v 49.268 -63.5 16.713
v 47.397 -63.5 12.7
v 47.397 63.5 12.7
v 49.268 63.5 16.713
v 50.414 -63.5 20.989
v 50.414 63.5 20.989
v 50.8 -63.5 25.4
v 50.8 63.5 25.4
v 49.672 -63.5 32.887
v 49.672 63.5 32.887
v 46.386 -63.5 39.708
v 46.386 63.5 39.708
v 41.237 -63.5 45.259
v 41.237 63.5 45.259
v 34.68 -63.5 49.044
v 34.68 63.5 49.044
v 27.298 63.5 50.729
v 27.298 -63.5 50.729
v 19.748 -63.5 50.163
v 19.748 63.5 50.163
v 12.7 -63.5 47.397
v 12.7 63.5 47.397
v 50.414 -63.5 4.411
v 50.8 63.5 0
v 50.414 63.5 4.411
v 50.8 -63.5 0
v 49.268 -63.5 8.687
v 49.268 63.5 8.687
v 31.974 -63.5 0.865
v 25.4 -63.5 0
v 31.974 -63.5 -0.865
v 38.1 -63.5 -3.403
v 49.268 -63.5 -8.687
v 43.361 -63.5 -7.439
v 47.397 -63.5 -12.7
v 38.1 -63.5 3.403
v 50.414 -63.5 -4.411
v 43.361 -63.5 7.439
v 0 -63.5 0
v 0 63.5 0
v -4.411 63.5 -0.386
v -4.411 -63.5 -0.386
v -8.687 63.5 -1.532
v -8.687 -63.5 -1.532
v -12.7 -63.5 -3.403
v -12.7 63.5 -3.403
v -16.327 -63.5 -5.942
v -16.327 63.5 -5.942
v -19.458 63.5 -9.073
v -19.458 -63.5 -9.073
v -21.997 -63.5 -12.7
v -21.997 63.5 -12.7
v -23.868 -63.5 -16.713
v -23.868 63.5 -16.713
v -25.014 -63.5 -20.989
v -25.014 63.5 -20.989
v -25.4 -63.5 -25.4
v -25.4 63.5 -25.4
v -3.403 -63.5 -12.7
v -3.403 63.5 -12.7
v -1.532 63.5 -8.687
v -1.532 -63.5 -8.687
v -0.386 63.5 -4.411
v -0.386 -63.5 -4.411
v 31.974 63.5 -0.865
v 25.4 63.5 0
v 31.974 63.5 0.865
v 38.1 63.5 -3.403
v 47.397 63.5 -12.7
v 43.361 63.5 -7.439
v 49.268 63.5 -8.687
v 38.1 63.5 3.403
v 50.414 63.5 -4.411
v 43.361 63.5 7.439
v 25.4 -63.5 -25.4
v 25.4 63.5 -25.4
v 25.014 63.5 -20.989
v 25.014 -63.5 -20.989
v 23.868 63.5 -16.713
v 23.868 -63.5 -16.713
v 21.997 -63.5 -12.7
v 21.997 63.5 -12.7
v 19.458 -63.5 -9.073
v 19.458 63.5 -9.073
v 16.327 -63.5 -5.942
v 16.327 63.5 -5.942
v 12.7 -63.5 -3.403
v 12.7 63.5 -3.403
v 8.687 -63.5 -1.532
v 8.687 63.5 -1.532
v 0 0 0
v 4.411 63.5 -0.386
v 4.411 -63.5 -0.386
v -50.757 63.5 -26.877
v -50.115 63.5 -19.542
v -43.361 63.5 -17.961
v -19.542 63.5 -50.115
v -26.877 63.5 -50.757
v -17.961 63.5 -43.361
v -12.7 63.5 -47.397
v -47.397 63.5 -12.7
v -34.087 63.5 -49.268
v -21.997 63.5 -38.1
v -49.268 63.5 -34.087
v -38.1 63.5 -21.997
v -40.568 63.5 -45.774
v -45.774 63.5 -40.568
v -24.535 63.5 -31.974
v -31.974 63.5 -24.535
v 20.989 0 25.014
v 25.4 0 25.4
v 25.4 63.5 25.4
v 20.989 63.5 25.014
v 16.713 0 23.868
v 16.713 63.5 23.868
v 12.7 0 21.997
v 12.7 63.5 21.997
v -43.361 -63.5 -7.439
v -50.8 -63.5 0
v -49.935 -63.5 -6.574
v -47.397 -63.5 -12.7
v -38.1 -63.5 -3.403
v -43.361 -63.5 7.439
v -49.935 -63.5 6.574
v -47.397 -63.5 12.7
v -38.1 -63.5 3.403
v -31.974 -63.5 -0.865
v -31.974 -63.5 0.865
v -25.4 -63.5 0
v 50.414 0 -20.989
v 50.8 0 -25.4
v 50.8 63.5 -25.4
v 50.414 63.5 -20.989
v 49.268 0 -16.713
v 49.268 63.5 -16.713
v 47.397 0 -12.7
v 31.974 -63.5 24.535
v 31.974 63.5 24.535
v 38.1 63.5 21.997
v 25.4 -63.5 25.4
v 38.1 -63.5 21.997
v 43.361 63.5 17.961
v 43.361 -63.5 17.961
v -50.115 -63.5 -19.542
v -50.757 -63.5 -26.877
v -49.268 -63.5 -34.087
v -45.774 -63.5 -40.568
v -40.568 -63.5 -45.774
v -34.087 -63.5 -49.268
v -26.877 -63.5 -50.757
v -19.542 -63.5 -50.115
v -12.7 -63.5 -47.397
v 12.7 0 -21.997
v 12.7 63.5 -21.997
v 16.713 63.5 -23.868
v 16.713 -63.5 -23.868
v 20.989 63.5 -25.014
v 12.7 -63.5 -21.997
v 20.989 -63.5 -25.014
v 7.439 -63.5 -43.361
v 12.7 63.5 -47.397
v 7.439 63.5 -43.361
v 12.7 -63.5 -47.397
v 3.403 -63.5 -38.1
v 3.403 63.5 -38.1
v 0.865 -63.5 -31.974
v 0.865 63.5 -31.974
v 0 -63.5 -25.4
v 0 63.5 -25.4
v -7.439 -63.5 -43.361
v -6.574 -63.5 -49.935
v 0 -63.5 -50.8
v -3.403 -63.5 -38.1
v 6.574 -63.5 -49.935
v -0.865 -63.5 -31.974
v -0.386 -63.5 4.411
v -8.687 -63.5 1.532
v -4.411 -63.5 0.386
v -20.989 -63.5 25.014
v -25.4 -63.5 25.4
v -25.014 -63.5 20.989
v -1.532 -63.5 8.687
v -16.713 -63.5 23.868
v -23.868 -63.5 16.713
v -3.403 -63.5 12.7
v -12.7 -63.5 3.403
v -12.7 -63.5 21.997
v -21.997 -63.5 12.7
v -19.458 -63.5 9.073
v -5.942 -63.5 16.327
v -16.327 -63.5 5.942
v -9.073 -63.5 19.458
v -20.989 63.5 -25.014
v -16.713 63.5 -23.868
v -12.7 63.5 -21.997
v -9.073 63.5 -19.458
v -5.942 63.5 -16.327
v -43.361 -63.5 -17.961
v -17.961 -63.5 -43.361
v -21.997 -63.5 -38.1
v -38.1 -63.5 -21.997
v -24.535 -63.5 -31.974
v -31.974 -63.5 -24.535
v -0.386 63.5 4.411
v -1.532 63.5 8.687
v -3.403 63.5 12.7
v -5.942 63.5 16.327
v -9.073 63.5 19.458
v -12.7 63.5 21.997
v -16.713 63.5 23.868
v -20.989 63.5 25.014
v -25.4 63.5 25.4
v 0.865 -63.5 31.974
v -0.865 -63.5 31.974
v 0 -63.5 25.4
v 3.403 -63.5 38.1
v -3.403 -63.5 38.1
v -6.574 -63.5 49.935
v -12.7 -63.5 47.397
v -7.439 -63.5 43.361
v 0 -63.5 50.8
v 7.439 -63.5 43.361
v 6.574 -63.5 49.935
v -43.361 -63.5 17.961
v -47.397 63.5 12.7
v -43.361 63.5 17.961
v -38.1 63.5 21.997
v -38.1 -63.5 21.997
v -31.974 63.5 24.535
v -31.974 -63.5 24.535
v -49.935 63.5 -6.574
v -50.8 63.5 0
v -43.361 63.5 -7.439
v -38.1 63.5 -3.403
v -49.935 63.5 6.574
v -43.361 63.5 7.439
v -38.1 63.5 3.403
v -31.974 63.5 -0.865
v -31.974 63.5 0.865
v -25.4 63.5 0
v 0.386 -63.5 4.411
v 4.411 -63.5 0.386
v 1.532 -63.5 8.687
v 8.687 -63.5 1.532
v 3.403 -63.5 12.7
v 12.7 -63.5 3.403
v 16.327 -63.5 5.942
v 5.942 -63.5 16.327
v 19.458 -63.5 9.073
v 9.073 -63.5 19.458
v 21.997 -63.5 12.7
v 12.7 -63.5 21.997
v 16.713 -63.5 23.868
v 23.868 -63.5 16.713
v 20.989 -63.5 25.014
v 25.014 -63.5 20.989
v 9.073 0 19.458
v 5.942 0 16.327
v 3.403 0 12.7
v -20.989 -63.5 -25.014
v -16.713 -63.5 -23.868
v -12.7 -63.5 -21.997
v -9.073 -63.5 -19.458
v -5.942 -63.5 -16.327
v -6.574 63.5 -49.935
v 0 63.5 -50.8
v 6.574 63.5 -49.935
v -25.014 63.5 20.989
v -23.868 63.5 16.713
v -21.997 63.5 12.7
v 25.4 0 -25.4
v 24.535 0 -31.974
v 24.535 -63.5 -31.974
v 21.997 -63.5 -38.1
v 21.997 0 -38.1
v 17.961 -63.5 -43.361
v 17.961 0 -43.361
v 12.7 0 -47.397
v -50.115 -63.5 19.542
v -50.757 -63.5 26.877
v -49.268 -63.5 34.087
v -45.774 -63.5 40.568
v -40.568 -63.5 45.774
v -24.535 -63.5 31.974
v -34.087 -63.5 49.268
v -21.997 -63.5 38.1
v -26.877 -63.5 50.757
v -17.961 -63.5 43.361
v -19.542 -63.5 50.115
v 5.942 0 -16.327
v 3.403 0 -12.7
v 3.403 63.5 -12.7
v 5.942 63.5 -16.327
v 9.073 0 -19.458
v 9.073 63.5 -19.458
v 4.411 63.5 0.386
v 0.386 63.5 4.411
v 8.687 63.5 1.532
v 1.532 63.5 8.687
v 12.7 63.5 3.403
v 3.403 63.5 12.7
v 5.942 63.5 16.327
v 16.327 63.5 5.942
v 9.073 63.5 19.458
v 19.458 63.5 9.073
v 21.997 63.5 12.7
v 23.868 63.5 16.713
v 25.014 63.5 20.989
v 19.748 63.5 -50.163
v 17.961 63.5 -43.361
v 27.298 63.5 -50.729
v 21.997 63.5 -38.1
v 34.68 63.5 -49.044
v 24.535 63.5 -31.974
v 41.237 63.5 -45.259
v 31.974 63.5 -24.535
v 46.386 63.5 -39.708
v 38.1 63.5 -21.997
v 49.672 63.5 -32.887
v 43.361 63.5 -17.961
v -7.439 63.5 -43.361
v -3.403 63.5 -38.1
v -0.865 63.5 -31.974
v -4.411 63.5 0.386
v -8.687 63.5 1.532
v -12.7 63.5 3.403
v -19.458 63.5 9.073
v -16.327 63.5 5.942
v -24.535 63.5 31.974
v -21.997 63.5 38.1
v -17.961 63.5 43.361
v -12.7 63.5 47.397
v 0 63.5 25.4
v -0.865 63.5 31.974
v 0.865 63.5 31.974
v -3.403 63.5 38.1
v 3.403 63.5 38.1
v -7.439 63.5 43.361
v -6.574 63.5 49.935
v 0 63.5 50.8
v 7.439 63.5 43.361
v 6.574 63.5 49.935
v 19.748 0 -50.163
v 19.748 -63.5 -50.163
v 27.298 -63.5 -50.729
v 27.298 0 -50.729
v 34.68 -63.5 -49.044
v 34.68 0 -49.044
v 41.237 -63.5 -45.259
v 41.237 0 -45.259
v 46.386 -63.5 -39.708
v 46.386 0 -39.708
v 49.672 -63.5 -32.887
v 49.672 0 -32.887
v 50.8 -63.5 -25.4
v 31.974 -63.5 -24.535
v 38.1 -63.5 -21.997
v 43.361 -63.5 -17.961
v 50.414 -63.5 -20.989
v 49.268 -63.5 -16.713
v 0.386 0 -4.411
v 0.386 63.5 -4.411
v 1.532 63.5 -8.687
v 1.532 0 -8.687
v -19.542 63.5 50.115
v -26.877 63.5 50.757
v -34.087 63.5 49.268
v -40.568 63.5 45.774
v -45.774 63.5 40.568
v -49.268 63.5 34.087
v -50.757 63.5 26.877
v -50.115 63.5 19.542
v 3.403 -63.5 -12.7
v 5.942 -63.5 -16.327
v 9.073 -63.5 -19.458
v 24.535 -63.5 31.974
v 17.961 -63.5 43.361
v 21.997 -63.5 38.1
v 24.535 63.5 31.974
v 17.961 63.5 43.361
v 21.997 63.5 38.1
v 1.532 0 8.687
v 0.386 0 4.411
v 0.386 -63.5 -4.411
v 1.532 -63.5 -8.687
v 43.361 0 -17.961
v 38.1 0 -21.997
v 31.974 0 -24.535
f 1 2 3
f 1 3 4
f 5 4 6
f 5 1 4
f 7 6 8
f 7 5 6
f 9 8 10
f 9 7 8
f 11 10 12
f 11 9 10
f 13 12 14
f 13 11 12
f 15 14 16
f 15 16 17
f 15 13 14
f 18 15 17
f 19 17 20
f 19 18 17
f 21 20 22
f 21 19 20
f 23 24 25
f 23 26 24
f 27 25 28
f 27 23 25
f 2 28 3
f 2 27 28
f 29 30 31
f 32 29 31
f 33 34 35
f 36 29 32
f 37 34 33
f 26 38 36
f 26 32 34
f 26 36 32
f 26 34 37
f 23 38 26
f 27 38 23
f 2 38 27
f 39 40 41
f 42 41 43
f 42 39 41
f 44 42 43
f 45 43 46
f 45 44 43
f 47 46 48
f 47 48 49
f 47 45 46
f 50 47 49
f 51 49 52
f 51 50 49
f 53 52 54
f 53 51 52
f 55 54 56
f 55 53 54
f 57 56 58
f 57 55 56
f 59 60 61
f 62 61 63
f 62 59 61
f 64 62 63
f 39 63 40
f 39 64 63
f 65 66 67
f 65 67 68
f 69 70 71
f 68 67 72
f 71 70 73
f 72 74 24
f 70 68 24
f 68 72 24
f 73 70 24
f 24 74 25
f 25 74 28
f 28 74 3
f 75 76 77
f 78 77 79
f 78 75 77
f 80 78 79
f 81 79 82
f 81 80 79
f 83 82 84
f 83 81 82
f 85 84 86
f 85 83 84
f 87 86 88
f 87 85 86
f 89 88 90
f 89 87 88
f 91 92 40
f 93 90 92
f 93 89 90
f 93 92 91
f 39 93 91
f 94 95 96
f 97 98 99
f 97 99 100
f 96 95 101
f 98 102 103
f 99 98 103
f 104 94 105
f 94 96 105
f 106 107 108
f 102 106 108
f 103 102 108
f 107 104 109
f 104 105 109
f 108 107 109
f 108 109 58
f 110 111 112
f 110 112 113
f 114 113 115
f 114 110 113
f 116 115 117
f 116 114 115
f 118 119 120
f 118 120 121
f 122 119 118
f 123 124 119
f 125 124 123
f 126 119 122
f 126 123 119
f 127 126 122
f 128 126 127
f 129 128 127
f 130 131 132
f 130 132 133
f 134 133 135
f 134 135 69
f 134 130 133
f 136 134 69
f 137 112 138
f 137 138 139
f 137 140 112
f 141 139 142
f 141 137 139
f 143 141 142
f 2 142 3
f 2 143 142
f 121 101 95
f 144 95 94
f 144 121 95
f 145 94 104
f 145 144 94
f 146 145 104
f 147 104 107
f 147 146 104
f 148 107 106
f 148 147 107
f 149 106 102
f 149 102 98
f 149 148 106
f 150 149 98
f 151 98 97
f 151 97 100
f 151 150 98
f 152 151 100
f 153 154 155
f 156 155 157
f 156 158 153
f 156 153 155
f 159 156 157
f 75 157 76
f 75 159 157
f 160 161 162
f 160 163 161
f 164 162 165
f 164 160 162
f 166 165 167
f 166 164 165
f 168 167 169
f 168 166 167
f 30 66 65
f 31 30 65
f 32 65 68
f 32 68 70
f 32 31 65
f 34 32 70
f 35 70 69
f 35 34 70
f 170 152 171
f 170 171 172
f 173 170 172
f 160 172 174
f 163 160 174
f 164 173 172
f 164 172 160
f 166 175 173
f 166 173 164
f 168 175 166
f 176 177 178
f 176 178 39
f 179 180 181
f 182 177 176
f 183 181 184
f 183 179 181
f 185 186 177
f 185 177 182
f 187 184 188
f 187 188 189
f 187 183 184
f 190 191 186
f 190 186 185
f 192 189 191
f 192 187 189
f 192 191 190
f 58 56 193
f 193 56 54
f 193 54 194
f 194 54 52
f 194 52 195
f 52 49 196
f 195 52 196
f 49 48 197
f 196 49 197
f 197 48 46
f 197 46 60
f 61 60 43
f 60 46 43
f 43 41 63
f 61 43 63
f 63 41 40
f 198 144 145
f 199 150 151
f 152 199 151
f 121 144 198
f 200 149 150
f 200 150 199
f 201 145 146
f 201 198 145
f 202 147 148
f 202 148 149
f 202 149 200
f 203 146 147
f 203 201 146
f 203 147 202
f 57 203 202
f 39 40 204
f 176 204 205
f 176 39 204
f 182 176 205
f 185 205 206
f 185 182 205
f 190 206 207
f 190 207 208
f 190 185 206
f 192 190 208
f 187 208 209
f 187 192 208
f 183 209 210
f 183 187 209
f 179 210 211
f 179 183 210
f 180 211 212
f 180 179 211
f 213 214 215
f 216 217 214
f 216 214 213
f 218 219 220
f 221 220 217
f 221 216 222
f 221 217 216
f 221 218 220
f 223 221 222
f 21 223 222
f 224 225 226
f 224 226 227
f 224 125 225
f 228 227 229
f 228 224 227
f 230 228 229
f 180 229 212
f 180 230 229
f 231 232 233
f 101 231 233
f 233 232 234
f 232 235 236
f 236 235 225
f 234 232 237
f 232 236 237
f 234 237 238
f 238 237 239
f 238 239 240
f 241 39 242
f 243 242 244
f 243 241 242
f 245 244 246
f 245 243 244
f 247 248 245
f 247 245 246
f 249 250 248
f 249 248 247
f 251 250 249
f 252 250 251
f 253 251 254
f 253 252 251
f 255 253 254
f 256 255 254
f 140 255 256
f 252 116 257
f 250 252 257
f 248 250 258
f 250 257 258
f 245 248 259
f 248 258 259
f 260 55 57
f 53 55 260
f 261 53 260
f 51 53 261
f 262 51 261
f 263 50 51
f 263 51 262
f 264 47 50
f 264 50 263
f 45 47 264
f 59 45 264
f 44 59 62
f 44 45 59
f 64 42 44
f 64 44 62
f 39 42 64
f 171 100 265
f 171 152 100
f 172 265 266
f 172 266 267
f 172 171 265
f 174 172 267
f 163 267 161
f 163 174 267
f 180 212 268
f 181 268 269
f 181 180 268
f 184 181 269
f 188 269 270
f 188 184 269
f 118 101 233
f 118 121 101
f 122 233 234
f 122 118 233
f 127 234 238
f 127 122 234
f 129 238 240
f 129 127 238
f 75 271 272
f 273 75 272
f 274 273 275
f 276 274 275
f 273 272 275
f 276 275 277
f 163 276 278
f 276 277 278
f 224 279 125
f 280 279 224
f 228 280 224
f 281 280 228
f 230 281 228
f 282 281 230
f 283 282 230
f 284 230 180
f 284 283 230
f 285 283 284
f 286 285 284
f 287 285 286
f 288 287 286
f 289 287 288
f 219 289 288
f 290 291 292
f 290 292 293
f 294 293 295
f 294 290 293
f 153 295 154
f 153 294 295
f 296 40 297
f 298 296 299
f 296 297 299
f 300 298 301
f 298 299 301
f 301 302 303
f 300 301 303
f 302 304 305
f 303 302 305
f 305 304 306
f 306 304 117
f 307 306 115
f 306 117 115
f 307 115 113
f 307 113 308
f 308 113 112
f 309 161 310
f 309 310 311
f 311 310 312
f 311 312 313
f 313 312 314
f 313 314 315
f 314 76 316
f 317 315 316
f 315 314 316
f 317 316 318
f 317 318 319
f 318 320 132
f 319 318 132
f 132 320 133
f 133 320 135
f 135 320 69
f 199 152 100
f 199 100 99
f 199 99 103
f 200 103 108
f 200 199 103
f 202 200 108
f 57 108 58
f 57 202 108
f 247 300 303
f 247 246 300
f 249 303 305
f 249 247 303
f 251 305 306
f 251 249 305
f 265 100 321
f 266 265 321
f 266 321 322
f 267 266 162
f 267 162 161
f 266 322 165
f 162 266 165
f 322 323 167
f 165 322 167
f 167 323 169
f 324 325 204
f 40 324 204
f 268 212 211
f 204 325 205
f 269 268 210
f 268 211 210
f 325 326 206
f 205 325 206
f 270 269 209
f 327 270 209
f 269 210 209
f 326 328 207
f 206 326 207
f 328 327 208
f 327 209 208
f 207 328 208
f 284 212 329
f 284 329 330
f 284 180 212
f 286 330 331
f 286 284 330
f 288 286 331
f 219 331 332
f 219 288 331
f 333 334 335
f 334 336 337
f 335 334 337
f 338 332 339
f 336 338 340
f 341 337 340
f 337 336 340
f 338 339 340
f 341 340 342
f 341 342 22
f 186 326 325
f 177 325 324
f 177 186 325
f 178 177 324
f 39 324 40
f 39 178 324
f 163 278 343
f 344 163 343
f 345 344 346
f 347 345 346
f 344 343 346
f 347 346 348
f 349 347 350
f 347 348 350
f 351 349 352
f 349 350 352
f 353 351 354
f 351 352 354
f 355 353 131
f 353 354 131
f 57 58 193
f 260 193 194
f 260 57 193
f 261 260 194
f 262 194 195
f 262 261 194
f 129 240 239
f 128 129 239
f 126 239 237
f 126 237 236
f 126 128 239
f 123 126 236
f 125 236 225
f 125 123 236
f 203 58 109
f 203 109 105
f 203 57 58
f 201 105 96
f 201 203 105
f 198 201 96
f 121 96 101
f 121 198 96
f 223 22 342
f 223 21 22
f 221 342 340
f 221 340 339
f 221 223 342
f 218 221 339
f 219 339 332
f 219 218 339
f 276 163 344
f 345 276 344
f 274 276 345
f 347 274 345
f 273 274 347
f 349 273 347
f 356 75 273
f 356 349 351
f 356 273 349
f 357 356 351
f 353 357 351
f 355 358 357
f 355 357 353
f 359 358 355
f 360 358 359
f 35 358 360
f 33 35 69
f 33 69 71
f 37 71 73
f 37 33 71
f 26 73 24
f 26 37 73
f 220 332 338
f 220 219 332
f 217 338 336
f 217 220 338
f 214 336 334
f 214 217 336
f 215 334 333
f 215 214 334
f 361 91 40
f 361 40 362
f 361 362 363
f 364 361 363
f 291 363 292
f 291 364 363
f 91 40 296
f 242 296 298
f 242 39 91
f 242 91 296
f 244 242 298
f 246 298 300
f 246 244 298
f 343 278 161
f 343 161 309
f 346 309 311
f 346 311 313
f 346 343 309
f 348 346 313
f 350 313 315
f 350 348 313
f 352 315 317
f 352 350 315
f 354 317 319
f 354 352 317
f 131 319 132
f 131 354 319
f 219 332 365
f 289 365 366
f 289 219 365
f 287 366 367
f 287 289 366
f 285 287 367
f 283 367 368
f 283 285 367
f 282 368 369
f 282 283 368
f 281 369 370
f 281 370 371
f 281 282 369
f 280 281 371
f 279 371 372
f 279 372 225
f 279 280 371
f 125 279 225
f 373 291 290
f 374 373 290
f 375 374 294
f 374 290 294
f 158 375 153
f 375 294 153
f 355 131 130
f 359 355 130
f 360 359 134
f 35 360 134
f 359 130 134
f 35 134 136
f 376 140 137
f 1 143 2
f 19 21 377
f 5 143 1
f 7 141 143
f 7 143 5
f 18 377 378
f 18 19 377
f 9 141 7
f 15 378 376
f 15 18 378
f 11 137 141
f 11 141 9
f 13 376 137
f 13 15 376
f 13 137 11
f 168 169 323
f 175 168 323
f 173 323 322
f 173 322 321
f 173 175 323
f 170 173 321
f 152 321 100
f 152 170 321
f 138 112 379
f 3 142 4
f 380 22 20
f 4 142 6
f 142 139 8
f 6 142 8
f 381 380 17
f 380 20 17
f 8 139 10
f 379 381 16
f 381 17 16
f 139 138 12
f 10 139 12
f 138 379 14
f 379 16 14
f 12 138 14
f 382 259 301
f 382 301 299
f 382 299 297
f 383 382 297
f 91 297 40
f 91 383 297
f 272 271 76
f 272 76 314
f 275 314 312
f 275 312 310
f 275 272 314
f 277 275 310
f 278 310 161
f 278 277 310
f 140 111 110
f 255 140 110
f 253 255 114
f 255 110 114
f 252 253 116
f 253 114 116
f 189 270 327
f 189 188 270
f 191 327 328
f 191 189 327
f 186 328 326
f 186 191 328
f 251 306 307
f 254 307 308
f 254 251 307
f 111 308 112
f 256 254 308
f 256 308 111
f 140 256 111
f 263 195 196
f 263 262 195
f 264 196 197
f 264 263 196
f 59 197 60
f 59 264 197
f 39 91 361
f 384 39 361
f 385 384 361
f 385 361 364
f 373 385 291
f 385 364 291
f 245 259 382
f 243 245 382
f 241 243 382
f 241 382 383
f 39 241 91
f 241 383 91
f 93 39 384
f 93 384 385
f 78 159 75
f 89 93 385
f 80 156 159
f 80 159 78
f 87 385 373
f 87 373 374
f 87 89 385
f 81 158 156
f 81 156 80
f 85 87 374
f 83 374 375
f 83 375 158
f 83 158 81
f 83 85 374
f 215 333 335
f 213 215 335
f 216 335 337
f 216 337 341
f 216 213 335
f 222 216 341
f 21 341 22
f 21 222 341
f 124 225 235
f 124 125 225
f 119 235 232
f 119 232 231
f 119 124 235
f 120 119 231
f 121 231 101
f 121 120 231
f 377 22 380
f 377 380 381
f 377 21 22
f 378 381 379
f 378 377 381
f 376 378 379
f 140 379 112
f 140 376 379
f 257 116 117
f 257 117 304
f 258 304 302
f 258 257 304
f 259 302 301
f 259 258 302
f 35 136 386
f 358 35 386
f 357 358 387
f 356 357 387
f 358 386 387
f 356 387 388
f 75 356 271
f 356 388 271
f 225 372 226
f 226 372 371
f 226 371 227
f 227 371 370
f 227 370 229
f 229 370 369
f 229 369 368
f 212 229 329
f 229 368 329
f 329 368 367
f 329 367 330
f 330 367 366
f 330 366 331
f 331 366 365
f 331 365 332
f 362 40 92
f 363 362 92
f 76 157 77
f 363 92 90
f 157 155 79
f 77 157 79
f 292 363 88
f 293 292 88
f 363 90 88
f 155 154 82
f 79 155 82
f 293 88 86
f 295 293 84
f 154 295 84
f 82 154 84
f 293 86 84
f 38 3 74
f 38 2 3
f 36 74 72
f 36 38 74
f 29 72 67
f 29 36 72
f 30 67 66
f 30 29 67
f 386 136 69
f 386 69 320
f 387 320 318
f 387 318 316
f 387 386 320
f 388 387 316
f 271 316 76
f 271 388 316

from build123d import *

# Parameters (mm, degrees)
F1_DEPTH = 63.5


with BuildPart() as f1:
    # F0 (on Front) → F1 (new body, symmetric)
    with BuildSketch(Plane.XZ):
        with BuildLine():
            ThreePointArc((47.3970452561, 12.7), (38.1, 3.4029547439), (25.4, 0))
            ThreePointArc((25.4, 0), (38.1, -3.4029547439), (47.3970452561, -12.7))
            ThreePointArc((47.3970452561, -12.7), (49.9345159877, -6.5740037456), (50.8, 0))
            ThreePointArc((50.8, 0), (49.9345159877, 6.5740037456), (47.3970452561, 12.7))
        make_face()
    extrude(amount=F1_DEPTH, both=True)


with BuildPart() as f1b:
    # F0 (on Front) → F1, piece 2 (new body, symmetric)
    with BuildSketch(Plane.XZ):
        with BuildLine():
            ThreePointArc((12.7, 3.4029547439), (17.9605122421, 7.4394877579), (21.9970452561, 12.7))
            ThreePointArc((21.9970452561, 12.7), (17.9605122421, 17.9605122421), (12.7, 21.9970452561))
            ThreePointArc((12.7, 21.9970452561), (7.4394877579, 17.9605122421), (3.4029547439, 12.7))
            ThreePointArc((3.4029547439, 12.7), (7.4394877579, 7.4394877579), (12.7, 3.4029547439))
        make_face()
        with BuildLine():
            ThreePointArc((12.7, 21.9970452561), (17.9605122421, 17.9605122421), (21.9970452561, 12.7))
            ThreePointArc((21.9970452561, 12.7), (24.5345159877, 18.8259962544), (25.4, 25.4))
            ThreePointArc((25.4, 25.4), (18.8259962544, 24.5345159877), (12.7, 21.9970452561))
        make_face()
        with BuildLine():
            ThreePointArc((0, 0), (6.5740037456, 0.8654840123), (12.7, 3.4029547439))
            ThreePointArc((12.7, 3.4029547439), (7.4394877579, 7.4394877579), (3.4029547439, 12.7))
            ThreePointArc((3.4029547439, 12.7), (0.8654840123, 6.5740037456), (0, 0))
        make_face()
    extrude(amount=F1_DEPTH, both=True)


with BuildPart() as f1c:
    # F0 (on Front) → F1, piece 3 (new body, symmetric)
    with BuildSketch(Plane.XZ):
        with BuildLine():
            ThreePointArc((25.4, -25.4), (24.5345159877, -18.8259962544), (21.9970452561, -12.7))
            ThreePointArc((21.9970452561, -12.7), (17.9605122421, -17.9605122421), (12.7, -21.9970452561))
            ThreePointArc((12.7, -21.9970452561), (18.8259962544, -24.5345159877), (25.4, -25.4))
        make_face()
        with BuildLine():
            ThreePointArc((12.7, -21.9970452561), (17.9605122421, -17.9605122421), (21.9970452561, -12.7))
            ThreePointArc((21.9970452561, -12.7), (17.9605122421, -7.4394877579), (12.7, -3.4029547439))
            ThreePointArc((12.7, -3.4029547439), (7.4394877579, -7.4394877579), (3.4029547439, -12.7))
            ThreePointArc((3.4029547439, -12.7), (7.4394877579, -17.9605122421), (12.7, -21.9970452561))
        make_face()
        with BuildLine():
            ThreePointArc((3.4029547439, -12.7), (7.4394877579, -7.4394877579), (12.7, -3.4029547439))
            ThreePointArc((12.7, -3.4029547439), (6.5740037456, -0.8654840123), (0, 0))
            ThreePointArc((0, 0), (0.8654840123, -6.5740037456), (3.4029547439, -12.7))
        make_face()
    extrude(amount=F1_DEPTH, both=True)


with BuildPart() as f1d:
    # F0 (on Front) → F1, piece 4 (new body, symmetric)
    with BuildSketch(Plane.XZ):
        with BuildLine():
            ThreePointArc((25.4, 25.4), (38.1, 21.9970452561), (47.3970452561, 12.7))
            ThreePointArc((47.3970452561, 12.7), (49.9345159877, 18.8259962544), (50.8, 25.4))
            ThreePointArc((50.8, 25.4), (38.1, 47.3970452561), (12.7, 47.3970452561))
            ThreePointArc((12.7, 47.3970452561), (21.9970452561, 38.1), (25.4, 25.4))
        make_face()
    extrude(amount=F1_DEPTH, both=True)


with BuildPart() as f1e:
    # F0 (on Front) → F1, piece 5 (new body, symmetric)
    with BuildSketch(Plane.XZ):
        with BuildLine():
            ThreePointArc((50.8, -25.4), (49.9345159877, -18.8259962544), (47.3970452561, -12.7))
            ThreePointArc((47.3970452561, -12.7), (38.1, -21.9970452561), (25.4, -25.4))
            ThreePointArc((25.4, -25.4), (21.9970452561, -38.1), (12.7, -47.3970452561))
            ThreePointArc((12.7, -47.3970452561), (38.1, -47.3970452561), (50.8, -25.4))
        make_face()
    extrude(amount=F1_DEPTH, both=True)


with BuildPart() as f1f:
    # F0 (on Front) → F1, piece 6 (new body, symmetric)
    with BuildSketch(Plane.XZ):
        with BuildLine():
            ThreePointArc((-3.4029547439, -12.7), (-0.8654840123, -6.5740037456), (0, 0))
            ThreePointArc((0, 0), (-6.5740037456, -0.8654840123), (-12.7, -3.4029547439))
            ThreePointArc((-12.7, -3.4029547439), (-7.4394877579, -7.4394877579), (-3.4029547439, -12.7))
        make_face()
        with BuildLine():
            ThreePointArc((-3.4029547439, -12.7), (-7.4394877579, -7.4394877579), (-12.7, -3.4029547439))
            ThreePointArc((-12.7, -3.4029547439), (-17.9605122421, -7.4394877579), (-21.9970452561, -12.7))
            ThreePointArc((-21.9970452561, -12.7), (-17.9605122421, -17.9605122421), (-12.7, -21.9970452561))
            ThreePointArc((-12.7, -21.9970452561), (-7.4394877579, -17.9605122421), (-3.4029547439, -12.7))
        make_face()
        with BuildLine():
            ThreePointArc((-25.4, -25.4), (-18.8259962544, -24.5345159877), (-12.7, -21.9970452561))
            ThreePointArc((-12.7, -21.9970452561), (-17.9605122421, -17.9605122421), (-21.9970452561, -12.7))
            ThreePointArc((-21.9970452561, -12.7), (-24.5345159877, -18.8259962544), (-25.4, -25.4))
        make_face()
    extrude(amount=F1_DEPTH, both=True)


with BuildPart() as f1g:
    # F0 (on Front) → F1, piece 7 (new body, symmetric)
    with BuildSketch(Plane.XZ):
        with BuildLine():
            ThreePointArc((-12.7, 3.4029547439), (-6.5740037456, 0.8654840123), (0, 0))
            ThreePointArc((0, 0), (-0.8654840123, 6.5740037456), (-3.4029547439, 12.7))
            ThreePointArc((-3.4029547439, 12.7), (-7.4394877579, 7.4394877579), (-12.7, 3.4029547439))
        make_face()
        with BuildLine():
            ThreePointArc((-21.9970452561, 12.7), (-17.9605122421, 7.4394877579), (-12.7, 3.4029547439))
            ThreePointArc((-12.7, 3.4029547439), (-7.4394877579, 7.4394877579), (-3.4029547439, 12.7))
            ThreePointArc((-3.4029547439, 12.7), (-7.4394877579, 17.9605122421), (-12.7, 21.9970452561))
            ThreePointArc((-12.7, 21.9970452561), (-17.9605122421, 17.9605122421), (-21.9970452561, 12.7))
        make_face()
        with BuildLine():
            ThreePointArc((-21.9970452561, 12.7), (-17.9605122421, 17.9605122421), (-12.7, 21.9970452561))
            ThreePointArc((-12.7, 21.9970452561), (-18.8259962544, 24.5345159877), (-25.4, 25.4))
            ThreePointArc((-25.4, 25.4), (-24.5345159877, 18.8259962544), (-21.9970452561, 12.7))
        make_face()
    extrude(amount=F1_DEPTH, both=True)


with BuildPart() as f1h:
    # F0 (on Front) → F1, piece 8 (new body, symmetric)
    with BuildSketch(Plane.XZ):
        with BuildLine():
            ThreePointArc((-12.7, 47.3970452561), (-3.4029547439, 38.1), (0, 25.4))
            ThreePointArc((0, 25.4), (3.4029547439, 38.1), (12.7, 47.3970452561))
            ThreePointArc((12.7, 47.3970452561), (0, 50.8), (-12.7, 47.3970452561))
        make_face()
    extrude(amount=F1_DEPTH, both=True)


with BuildPart() as f1i:
    # F0 (on Front) → F1, piece 9 (new body, symmetric)
    with BuildSketch(Plane.XZ):
        with BuildLine():
            ThreePointArc((12.7, -47.3970452561), (3.4029547439, -38.1), (0, -25.4))
            ThreePointArc((0, -25.4), (-3.4029547439, -38.1), (-12.7, -47.3970452561))
            ThreePointArc((-12.7, -47.3970452561), (0, -50.8), (12.7, -47.3970452561))
        make_face()
    extrude(amount=F1_DEPTH, both=True)


with BuildPart() as f1j:
    # F0 (on Front) → F1, piece 10 (new body, symmetric)
    with BuildSketch(Plane.XZ):
        with BuildLine():
            ThreePointArc((-25.4, 25.4), (-21.9970452561, 38.1), (-12.7, 47.3970452561))
            ThreePointArc((-12.7, 47.3970452561), (-43.3605122421, 43.3605122421), (-47.3970452561, 12.7))
            ThreePointArc((-47.3970452561, 12.7), (-38.1, 21.9970452561), (-25.4, 25.4))
        make_face()
    extrude(amount=F1_DEPTH, both=True)


with BuildPart() as f1k:
    # F0 (on Front) → F1, piece 11 (new body, symmetric)
    with BuildSketch(Plane.XZ):
        with BuildLine():
            ThreePointArc((-47.3970452561, -12.7), (-43.3605122421, -43.3605122421), (-12.7, -47.3970452561))
            ThreePointArc((-12.7, -47.3970452561), (-21.9970452561, -38.1), (-25.4, -25.4))
            ThreePointArc((-25.4, -25.4), (-38.1, -21.9970452561), (-47.3970452561, -12.7))
        make_face()
    extrude(amount=F1_DEPTH, both=True)


with BuildPart() as f1l:
    # F0 (on Front) → F1, piece 12 (new body, symmetric)
    with BuildSketch(Plane.XZ):
        with BuildLine():
            ThreePointArc((-47.3970452561, -12.7), (-38.1, -3.4029547439), (-25.4, 0))
            ThreePointArc((-25.4, 0), (-38.1, 3.4029547439), (-47.3970452561, 12.7))
            ThreePointArc((-47.3970452561, 12.7), (-50.8, 0), (-47.3970452561, -12.7))
        make_face()
    extrude(amount=F1_DEPTH, both=True)


solid = Compound([f1.part, f1b.part, f1c.part, f1d.part, f1e.part, f1f.part, f1g.part, f1h.part, f1i.part, f1j.part, f1k.part, f1l.part])
